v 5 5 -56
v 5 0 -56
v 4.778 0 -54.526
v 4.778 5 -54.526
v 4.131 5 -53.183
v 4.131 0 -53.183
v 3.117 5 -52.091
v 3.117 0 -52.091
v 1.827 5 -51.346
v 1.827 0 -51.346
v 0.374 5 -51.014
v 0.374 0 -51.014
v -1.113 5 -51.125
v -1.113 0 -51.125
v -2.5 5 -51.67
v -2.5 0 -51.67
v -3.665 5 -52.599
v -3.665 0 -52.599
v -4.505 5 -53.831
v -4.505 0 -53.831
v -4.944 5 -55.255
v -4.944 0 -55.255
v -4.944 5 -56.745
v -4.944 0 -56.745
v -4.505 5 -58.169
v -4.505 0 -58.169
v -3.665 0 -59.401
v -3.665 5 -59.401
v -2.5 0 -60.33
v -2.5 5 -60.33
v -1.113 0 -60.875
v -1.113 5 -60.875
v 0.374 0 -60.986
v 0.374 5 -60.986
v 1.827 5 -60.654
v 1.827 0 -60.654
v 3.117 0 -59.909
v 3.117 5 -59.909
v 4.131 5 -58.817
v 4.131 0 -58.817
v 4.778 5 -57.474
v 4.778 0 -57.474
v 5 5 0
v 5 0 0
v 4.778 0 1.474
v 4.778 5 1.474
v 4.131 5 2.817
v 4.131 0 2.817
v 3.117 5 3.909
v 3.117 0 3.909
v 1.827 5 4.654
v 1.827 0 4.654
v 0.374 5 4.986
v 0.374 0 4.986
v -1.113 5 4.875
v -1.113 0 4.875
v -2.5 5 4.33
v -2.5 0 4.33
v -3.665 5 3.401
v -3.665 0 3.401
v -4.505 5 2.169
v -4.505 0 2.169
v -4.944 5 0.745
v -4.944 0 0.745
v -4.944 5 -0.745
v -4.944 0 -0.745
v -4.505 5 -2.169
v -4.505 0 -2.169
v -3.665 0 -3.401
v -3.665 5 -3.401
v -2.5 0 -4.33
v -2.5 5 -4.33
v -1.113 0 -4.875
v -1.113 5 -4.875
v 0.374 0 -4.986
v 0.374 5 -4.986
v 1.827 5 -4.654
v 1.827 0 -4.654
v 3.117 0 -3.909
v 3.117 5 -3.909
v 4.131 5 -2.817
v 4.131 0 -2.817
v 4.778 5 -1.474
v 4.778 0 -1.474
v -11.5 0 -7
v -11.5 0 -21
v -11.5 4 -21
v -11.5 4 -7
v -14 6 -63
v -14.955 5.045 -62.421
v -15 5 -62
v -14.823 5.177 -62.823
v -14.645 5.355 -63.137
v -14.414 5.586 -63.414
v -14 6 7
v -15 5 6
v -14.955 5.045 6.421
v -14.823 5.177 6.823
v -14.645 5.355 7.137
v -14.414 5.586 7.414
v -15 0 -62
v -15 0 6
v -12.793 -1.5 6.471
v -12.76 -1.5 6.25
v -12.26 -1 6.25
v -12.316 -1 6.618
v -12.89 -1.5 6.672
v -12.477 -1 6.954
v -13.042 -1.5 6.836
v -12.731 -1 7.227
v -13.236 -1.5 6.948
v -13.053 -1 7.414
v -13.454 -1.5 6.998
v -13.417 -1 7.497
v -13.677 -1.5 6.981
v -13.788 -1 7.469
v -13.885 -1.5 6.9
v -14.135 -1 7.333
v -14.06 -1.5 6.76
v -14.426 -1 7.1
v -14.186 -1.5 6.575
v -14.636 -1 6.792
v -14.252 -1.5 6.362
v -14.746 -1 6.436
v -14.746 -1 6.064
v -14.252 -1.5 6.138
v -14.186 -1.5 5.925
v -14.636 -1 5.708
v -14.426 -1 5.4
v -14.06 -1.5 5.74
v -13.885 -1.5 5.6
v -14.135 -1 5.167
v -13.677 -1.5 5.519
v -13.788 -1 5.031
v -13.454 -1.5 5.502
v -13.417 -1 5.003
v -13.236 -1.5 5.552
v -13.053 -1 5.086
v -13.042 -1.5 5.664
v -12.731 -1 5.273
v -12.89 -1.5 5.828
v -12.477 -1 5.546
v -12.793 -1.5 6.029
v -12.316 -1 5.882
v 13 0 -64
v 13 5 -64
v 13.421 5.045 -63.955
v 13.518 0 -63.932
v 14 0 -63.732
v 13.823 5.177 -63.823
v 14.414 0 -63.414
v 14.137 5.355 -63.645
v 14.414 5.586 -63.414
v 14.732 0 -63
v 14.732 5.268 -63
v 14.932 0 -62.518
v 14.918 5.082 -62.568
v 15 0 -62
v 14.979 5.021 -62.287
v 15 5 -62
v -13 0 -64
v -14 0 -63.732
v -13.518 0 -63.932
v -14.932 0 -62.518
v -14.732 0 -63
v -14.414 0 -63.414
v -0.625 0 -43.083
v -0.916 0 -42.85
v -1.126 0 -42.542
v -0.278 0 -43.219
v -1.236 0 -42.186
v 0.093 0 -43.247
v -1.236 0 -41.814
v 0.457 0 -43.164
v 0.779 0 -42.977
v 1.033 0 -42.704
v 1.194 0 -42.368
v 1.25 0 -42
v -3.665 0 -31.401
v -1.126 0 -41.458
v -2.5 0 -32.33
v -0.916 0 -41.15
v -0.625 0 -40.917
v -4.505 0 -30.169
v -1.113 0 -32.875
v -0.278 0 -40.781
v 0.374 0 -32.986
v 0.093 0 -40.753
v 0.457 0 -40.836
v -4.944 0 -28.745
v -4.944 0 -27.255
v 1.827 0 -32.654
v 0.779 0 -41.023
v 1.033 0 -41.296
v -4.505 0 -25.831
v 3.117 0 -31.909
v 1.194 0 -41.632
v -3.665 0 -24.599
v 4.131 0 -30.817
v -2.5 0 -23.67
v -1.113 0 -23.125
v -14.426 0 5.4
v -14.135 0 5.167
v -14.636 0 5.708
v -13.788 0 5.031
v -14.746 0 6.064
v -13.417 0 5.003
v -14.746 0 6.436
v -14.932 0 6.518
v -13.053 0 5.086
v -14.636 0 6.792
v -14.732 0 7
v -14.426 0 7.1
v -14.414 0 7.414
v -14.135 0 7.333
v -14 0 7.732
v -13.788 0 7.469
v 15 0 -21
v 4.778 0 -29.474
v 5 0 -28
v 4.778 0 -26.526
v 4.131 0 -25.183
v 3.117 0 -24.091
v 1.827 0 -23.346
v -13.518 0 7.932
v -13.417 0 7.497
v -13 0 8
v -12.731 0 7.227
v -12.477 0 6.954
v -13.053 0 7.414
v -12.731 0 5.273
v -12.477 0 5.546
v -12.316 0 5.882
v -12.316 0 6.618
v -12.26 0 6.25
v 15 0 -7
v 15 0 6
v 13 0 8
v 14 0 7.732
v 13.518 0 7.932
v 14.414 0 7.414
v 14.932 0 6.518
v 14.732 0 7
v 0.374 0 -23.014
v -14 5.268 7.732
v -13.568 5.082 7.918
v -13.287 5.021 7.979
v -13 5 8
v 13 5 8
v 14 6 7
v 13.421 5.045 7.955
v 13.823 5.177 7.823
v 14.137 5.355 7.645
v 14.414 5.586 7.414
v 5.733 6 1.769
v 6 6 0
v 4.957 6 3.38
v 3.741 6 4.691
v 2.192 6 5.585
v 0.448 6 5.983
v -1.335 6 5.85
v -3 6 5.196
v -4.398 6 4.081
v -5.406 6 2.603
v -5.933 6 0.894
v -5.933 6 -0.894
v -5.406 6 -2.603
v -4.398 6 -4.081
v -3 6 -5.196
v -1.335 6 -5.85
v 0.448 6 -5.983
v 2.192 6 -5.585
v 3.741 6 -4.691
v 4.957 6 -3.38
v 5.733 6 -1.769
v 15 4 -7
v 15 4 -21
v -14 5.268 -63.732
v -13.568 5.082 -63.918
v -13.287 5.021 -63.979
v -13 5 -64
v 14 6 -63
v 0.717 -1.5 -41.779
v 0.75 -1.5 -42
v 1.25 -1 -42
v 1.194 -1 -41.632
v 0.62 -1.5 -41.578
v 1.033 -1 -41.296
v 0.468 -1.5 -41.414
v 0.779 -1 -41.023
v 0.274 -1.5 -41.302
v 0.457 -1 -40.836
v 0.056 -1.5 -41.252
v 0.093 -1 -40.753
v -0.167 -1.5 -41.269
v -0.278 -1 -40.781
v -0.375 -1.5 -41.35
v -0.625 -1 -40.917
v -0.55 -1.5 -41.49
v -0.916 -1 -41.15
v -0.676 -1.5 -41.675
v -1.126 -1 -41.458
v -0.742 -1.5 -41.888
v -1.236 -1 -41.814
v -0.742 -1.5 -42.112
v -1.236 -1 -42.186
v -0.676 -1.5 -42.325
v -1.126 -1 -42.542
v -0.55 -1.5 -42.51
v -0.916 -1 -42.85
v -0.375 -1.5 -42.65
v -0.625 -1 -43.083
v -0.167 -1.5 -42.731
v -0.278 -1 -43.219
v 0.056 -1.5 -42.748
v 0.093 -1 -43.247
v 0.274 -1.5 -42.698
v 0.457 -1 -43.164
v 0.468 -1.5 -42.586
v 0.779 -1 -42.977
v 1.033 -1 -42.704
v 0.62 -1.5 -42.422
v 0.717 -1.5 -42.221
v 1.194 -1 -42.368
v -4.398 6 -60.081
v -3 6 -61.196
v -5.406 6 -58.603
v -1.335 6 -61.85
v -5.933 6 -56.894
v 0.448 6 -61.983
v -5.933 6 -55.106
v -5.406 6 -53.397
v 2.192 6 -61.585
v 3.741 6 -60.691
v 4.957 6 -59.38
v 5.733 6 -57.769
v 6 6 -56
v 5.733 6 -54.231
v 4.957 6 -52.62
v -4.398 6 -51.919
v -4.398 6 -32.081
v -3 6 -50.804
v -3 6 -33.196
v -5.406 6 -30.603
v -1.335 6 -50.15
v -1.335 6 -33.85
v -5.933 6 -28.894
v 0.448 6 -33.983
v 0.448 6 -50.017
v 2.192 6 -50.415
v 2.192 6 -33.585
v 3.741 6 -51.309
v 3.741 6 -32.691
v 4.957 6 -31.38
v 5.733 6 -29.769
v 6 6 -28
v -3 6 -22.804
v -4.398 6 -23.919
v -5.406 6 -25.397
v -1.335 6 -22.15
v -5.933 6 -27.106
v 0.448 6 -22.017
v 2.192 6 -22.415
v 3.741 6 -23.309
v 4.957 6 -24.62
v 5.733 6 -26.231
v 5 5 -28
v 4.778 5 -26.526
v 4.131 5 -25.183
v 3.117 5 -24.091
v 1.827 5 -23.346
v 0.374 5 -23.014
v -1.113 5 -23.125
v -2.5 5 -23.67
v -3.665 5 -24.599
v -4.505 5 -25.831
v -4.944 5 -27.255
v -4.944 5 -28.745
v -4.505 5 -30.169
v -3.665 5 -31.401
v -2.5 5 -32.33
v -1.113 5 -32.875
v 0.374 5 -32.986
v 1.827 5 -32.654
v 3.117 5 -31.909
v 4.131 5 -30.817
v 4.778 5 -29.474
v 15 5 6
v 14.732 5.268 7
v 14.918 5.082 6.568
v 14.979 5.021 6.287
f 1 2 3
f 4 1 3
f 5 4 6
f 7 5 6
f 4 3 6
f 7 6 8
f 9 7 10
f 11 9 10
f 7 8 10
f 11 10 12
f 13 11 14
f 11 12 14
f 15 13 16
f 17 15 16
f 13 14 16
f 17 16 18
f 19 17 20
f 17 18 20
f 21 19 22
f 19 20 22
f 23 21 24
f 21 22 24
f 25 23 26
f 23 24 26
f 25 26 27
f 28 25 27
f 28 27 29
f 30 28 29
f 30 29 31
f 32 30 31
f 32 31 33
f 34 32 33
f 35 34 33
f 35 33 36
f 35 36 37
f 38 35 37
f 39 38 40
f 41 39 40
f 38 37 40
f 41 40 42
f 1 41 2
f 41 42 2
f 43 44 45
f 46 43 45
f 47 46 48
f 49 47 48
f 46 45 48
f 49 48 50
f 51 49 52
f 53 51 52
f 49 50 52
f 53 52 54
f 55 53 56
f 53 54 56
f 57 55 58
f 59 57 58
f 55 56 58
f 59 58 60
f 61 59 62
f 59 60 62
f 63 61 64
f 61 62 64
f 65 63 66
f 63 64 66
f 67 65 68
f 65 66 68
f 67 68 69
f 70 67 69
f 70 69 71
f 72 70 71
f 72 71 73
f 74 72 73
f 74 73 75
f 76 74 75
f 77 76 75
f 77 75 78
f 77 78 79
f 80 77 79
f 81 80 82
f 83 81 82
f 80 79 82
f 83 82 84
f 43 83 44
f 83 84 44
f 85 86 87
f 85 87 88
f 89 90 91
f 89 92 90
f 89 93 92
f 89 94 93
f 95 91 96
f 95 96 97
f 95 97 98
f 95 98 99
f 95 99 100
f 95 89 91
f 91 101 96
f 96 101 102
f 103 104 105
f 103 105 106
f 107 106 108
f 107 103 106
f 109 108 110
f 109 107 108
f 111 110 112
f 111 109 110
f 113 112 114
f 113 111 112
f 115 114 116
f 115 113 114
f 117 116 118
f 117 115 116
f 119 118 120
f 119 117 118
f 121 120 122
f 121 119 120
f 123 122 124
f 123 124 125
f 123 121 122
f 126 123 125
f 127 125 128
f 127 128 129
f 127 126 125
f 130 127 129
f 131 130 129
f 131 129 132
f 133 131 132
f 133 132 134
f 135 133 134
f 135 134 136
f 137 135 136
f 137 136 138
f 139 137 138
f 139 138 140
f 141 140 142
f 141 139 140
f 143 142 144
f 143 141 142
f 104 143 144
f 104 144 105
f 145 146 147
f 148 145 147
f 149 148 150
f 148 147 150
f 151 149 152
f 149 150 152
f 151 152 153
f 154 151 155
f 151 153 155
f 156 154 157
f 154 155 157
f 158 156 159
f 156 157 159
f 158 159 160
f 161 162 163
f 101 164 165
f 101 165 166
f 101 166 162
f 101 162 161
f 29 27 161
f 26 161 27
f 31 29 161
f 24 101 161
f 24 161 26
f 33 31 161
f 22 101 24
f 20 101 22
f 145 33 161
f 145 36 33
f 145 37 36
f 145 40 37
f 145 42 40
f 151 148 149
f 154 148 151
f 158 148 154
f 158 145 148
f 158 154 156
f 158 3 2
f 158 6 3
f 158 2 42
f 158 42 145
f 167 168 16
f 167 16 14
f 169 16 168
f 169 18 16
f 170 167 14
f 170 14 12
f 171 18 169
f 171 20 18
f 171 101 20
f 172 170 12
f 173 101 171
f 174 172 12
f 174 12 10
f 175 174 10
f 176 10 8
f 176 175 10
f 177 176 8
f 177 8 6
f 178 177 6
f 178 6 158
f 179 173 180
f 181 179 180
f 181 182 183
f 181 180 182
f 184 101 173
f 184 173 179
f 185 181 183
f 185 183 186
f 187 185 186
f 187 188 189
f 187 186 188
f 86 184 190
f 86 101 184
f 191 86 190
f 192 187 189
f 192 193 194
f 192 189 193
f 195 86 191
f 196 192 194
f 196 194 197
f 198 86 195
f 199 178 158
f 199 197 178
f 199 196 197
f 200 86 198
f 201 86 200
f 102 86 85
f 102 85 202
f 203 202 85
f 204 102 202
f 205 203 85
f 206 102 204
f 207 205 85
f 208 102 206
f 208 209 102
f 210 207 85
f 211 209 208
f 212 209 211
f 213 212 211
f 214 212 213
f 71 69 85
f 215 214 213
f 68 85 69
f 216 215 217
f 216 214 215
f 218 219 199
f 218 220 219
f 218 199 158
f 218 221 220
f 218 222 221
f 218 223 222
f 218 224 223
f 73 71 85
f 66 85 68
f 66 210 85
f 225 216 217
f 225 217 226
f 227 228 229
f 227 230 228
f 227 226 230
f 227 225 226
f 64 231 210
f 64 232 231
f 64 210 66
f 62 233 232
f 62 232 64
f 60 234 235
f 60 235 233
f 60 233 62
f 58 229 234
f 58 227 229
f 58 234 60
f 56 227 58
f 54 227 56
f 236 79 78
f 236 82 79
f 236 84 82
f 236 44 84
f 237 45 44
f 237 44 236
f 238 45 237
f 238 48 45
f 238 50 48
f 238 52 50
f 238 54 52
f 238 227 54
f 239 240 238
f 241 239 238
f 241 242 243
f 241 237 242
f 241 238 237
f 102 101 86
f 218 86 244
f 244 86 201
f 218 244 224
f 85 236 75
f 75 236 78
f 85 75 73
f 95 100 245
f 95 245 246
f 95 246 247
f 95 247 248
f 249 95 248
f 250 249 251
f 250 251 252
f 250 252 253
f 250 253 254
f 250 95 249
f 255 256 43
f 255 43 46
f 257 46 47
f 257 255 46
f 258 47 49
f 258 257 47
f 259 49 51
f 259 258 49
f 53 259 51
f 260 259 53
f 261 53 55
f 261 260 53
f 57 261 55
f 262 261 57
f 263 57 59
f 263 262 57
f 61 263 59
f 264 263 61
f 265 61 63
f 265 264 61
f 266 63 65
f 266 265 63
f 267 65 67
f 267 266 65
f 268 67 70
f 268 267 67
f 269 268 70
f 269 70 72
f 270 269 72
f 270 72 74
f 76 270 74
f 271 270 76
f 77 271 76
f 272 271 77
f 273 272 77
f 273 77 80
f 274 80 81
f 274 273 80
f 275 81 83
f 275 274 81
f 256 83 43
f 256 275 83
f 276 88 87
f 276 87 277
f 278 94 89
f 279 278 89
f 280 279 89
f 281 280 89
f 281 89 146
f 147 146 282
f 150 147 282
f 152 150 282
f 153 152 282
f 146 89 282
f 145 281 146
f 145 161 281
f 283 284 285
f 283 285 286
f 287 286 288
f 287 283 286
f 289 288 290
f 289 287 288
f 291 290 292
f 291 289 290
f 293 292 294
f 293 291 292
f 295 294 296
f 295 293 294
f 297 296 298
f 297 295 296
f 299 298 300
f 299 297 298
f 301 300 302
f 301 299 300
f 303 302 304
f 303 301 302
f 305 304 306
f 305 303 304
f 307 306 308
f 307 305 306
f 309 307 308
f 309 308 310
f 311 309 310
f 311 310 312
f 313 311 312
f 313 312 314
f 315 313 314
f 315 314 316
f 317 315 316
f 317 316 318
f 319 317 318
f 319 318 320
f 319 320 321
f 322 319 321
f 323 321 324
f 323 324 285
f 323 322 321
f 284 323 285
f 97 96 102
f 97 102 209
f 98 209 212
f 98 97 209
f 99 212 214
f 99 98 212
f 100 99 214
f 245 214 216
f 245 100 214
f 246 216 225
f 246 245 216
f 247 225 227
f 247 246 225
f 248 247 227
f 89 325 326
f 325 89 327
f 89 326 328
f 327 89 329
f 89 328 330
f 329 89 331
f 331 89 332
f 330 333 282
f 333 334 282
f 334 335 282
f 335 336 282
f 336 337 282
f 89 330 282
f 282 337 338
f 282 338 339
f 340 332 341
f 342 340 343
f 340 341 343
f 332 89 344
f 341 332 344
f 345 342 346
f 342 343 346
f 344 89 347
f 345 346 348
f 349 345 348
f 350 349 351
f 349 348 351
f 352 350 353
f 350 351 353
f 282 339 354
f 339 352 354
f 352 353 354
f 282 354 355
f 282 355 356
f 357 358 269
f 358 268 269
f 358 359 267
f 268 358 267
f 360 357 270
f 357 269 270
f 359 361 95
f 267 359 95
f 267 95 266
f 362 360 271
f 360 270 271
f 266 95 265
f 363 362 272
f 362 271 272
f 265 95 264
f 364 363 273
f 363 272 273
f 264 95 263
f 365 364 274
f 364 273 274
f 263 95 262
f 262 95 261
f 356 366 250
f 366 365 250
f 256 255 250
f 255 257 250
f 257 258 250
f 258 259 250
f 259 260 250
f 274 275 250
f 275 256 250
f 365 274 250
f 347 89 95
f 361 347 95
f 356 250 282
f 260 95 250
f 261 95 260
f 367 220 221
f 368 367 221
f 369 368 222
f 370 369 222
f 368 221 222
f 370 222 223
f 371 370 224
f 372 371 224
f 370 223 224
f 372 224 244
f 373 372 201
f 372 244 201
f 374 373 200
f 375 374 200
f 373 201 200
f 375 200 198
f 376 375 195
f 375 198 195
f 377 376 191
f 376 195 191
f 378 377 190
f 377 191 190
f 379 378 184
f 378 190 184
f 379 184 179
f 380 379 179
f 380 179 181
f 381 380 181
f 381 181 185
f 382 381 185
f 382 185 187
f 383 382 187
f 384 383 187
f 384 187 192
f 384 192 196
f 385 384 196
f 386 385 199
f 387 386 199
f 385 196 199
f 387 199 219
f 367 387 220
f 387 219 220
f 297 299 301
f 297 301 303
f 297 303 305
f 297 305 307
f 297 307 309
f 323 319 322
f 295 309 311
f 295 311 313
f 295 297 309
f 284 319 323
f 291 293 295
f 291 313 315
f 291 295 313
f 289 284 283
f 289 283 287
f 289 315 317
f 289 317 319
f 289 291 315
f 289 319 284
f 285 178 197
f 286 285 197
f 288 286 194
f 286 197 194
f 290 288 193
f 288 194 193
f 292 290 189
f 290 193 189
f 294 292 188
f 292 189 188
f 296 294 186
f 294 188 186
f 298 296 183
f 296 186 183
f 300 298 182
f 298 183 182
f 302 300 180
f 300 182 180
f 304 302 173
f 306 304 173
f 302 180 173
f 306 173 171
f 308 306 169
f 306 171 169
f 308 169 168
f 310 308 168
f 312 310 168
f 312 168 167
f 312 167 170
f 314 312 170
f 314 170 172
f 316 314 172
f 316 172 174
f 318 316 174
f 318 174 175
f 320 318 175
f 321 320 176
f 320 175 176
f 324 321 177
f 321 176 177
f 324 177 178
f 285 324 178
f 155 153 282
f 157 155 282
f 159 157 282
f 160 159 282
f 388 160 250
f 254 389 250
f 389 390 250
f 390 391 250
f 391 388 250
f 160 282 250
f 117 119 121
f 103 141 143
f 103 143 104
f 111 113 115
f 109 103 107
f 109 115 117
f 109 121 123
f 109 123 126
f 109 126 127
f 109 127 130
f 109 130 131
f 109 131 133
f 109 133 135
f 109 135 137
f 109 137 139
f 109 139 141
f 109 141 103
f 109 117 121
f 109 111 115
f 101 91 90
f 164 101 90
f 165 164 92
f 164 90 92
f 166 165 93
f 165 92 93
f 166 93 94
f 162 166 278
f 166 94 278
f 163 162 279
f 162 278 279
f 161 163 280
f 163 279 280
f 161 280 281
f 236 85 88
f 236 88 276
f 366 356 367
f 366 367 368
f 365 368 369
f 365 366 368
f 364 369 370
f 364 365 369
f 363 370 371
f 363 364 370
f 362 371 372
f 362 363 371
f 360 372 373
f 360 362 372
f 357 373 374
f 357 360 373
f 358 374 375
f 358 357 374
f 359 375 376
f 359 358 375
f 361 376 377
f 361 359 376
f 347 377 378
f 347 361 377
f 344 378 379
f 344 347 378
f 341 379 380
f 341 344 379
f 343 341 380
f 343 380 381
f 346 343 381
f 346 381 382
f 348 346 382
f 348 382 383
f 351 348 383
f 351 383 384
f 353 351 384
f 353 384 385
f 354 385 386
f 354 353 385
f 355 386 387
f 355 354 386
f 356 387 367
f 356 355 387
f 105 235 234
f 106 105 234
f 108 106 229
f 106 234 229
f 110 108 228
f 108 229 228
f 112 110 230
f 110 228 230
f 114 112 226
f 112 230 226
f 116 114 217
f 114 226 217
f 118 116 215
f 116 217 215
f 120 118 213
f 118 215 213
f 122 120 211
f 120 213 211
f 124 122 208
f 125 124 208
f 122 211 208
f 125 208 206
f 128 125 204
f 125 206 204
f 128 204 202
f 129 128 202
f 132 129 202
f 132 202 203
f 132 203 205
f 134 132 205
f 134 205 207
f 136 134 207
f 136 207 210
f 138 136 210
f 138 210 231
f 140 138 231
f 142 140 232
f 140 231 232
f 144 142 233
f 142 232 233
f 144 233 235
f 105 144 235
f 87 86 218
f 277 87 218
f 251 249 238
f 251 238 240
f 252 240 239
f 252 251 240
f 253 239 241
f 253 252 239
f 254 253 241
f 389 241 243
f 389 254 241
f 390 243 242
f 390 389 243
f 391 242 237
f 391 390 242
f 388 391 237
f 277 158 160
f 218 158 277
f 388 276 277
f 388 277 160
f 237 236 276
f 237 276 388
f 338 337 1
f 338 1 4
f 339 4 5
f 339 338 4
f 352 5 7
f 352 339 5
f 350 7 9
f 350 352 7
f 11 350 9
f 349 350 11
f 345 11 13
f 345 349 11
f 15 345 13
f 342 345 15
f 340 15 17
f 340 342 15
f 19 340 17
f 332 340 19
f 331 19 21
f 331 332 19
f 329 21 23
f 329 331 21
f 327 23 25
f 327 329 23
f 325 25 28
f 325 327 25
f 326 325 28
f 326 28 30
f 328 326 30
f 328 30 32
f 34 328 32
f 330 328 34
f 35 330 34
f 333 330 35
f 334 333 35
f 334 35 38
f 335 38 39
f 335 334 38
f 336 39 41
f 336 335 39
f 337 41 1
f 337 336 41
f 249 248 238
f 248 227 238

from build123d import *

# Parameters (mm, degrees)
F0_W     = 30
F0_H     = 72
F0_R     = 5
F1_DEPTH = 6
F2_R     = 1.25
F3_DEPTH = 1.5
F4_SIZE  = 0.5
F5_SIZE  = 1
F6_R     = 2
F7_W     = 34.31184
F7_H     = 14
F8_DEPTH = 4


with BuildPart() as f1:
    # F0 (on Front) → F1 (new body)
    with BuildSketch(Plane.XZ):
        with Locations((0, -28)):
            Rectangle(F0_W, F0_H)
        with Locations((0, -56)):
            Circle(F0_R, mode=Mode.SUBTRACT)
        with Locations((0, -28)):
            Circle(F0_R, mode=Mode.SUBTRACT)
        Circle(F0_R, mode=Mode.SUBTRACT)
    extrude(amount=-F1_DEPTH)

    # F2 (on Front) → F3 (join)
    with BuildSketch(Plane.XZ):
        with Locations((-13.51, 6.25)):
            Circle(F2_R)
        with Locations((0, -42)):
            Circle(F2_R)
    extrude(amount=F3_DEPTH)

    # F4
    f4_edges = [f1.edges().sort_by_distance(p)[0] for p in [
        (-14.76, -1.5, 6.25),
        (-1.25, -1.5, -42),
    ]]
    chamfer(f4_edges, length=F4_SIZE)

    # F5
    f5_edges = [f1.edges().sort_by_distance(p)[0] for p in [
        (-5, 6, -56),
        (-5, 6, -28),
        (-5, 6, 0),
        (-15, 6, -28),
        (0, 6, -64),
        (0, 6, 8),
        (15, 6, -28),
    ]]
    chamfer(f5_edges, length=F5_SIZE)

    # F6
    f6_edges = [f1.edges().sort_by_distance(p)[0] for p in [
        (-15, 2.5, 8),
        (15, 2.5, 8),
        (15, 2.5, -64),
        (-15, 2.5, -64),
    ]]
    fillet(f6_edges, radius=F6_R)

    # F7 (on Front) → F8 (cut)
    with BuildSketch(Plane.XZ):
        with Locations((5.65592, -14)):
            Rectangle(F7_W, F7_H)
    extrude(amount=-F8_DEPTH, mode=Mode.SUBTRACT)


solid = f1.part
